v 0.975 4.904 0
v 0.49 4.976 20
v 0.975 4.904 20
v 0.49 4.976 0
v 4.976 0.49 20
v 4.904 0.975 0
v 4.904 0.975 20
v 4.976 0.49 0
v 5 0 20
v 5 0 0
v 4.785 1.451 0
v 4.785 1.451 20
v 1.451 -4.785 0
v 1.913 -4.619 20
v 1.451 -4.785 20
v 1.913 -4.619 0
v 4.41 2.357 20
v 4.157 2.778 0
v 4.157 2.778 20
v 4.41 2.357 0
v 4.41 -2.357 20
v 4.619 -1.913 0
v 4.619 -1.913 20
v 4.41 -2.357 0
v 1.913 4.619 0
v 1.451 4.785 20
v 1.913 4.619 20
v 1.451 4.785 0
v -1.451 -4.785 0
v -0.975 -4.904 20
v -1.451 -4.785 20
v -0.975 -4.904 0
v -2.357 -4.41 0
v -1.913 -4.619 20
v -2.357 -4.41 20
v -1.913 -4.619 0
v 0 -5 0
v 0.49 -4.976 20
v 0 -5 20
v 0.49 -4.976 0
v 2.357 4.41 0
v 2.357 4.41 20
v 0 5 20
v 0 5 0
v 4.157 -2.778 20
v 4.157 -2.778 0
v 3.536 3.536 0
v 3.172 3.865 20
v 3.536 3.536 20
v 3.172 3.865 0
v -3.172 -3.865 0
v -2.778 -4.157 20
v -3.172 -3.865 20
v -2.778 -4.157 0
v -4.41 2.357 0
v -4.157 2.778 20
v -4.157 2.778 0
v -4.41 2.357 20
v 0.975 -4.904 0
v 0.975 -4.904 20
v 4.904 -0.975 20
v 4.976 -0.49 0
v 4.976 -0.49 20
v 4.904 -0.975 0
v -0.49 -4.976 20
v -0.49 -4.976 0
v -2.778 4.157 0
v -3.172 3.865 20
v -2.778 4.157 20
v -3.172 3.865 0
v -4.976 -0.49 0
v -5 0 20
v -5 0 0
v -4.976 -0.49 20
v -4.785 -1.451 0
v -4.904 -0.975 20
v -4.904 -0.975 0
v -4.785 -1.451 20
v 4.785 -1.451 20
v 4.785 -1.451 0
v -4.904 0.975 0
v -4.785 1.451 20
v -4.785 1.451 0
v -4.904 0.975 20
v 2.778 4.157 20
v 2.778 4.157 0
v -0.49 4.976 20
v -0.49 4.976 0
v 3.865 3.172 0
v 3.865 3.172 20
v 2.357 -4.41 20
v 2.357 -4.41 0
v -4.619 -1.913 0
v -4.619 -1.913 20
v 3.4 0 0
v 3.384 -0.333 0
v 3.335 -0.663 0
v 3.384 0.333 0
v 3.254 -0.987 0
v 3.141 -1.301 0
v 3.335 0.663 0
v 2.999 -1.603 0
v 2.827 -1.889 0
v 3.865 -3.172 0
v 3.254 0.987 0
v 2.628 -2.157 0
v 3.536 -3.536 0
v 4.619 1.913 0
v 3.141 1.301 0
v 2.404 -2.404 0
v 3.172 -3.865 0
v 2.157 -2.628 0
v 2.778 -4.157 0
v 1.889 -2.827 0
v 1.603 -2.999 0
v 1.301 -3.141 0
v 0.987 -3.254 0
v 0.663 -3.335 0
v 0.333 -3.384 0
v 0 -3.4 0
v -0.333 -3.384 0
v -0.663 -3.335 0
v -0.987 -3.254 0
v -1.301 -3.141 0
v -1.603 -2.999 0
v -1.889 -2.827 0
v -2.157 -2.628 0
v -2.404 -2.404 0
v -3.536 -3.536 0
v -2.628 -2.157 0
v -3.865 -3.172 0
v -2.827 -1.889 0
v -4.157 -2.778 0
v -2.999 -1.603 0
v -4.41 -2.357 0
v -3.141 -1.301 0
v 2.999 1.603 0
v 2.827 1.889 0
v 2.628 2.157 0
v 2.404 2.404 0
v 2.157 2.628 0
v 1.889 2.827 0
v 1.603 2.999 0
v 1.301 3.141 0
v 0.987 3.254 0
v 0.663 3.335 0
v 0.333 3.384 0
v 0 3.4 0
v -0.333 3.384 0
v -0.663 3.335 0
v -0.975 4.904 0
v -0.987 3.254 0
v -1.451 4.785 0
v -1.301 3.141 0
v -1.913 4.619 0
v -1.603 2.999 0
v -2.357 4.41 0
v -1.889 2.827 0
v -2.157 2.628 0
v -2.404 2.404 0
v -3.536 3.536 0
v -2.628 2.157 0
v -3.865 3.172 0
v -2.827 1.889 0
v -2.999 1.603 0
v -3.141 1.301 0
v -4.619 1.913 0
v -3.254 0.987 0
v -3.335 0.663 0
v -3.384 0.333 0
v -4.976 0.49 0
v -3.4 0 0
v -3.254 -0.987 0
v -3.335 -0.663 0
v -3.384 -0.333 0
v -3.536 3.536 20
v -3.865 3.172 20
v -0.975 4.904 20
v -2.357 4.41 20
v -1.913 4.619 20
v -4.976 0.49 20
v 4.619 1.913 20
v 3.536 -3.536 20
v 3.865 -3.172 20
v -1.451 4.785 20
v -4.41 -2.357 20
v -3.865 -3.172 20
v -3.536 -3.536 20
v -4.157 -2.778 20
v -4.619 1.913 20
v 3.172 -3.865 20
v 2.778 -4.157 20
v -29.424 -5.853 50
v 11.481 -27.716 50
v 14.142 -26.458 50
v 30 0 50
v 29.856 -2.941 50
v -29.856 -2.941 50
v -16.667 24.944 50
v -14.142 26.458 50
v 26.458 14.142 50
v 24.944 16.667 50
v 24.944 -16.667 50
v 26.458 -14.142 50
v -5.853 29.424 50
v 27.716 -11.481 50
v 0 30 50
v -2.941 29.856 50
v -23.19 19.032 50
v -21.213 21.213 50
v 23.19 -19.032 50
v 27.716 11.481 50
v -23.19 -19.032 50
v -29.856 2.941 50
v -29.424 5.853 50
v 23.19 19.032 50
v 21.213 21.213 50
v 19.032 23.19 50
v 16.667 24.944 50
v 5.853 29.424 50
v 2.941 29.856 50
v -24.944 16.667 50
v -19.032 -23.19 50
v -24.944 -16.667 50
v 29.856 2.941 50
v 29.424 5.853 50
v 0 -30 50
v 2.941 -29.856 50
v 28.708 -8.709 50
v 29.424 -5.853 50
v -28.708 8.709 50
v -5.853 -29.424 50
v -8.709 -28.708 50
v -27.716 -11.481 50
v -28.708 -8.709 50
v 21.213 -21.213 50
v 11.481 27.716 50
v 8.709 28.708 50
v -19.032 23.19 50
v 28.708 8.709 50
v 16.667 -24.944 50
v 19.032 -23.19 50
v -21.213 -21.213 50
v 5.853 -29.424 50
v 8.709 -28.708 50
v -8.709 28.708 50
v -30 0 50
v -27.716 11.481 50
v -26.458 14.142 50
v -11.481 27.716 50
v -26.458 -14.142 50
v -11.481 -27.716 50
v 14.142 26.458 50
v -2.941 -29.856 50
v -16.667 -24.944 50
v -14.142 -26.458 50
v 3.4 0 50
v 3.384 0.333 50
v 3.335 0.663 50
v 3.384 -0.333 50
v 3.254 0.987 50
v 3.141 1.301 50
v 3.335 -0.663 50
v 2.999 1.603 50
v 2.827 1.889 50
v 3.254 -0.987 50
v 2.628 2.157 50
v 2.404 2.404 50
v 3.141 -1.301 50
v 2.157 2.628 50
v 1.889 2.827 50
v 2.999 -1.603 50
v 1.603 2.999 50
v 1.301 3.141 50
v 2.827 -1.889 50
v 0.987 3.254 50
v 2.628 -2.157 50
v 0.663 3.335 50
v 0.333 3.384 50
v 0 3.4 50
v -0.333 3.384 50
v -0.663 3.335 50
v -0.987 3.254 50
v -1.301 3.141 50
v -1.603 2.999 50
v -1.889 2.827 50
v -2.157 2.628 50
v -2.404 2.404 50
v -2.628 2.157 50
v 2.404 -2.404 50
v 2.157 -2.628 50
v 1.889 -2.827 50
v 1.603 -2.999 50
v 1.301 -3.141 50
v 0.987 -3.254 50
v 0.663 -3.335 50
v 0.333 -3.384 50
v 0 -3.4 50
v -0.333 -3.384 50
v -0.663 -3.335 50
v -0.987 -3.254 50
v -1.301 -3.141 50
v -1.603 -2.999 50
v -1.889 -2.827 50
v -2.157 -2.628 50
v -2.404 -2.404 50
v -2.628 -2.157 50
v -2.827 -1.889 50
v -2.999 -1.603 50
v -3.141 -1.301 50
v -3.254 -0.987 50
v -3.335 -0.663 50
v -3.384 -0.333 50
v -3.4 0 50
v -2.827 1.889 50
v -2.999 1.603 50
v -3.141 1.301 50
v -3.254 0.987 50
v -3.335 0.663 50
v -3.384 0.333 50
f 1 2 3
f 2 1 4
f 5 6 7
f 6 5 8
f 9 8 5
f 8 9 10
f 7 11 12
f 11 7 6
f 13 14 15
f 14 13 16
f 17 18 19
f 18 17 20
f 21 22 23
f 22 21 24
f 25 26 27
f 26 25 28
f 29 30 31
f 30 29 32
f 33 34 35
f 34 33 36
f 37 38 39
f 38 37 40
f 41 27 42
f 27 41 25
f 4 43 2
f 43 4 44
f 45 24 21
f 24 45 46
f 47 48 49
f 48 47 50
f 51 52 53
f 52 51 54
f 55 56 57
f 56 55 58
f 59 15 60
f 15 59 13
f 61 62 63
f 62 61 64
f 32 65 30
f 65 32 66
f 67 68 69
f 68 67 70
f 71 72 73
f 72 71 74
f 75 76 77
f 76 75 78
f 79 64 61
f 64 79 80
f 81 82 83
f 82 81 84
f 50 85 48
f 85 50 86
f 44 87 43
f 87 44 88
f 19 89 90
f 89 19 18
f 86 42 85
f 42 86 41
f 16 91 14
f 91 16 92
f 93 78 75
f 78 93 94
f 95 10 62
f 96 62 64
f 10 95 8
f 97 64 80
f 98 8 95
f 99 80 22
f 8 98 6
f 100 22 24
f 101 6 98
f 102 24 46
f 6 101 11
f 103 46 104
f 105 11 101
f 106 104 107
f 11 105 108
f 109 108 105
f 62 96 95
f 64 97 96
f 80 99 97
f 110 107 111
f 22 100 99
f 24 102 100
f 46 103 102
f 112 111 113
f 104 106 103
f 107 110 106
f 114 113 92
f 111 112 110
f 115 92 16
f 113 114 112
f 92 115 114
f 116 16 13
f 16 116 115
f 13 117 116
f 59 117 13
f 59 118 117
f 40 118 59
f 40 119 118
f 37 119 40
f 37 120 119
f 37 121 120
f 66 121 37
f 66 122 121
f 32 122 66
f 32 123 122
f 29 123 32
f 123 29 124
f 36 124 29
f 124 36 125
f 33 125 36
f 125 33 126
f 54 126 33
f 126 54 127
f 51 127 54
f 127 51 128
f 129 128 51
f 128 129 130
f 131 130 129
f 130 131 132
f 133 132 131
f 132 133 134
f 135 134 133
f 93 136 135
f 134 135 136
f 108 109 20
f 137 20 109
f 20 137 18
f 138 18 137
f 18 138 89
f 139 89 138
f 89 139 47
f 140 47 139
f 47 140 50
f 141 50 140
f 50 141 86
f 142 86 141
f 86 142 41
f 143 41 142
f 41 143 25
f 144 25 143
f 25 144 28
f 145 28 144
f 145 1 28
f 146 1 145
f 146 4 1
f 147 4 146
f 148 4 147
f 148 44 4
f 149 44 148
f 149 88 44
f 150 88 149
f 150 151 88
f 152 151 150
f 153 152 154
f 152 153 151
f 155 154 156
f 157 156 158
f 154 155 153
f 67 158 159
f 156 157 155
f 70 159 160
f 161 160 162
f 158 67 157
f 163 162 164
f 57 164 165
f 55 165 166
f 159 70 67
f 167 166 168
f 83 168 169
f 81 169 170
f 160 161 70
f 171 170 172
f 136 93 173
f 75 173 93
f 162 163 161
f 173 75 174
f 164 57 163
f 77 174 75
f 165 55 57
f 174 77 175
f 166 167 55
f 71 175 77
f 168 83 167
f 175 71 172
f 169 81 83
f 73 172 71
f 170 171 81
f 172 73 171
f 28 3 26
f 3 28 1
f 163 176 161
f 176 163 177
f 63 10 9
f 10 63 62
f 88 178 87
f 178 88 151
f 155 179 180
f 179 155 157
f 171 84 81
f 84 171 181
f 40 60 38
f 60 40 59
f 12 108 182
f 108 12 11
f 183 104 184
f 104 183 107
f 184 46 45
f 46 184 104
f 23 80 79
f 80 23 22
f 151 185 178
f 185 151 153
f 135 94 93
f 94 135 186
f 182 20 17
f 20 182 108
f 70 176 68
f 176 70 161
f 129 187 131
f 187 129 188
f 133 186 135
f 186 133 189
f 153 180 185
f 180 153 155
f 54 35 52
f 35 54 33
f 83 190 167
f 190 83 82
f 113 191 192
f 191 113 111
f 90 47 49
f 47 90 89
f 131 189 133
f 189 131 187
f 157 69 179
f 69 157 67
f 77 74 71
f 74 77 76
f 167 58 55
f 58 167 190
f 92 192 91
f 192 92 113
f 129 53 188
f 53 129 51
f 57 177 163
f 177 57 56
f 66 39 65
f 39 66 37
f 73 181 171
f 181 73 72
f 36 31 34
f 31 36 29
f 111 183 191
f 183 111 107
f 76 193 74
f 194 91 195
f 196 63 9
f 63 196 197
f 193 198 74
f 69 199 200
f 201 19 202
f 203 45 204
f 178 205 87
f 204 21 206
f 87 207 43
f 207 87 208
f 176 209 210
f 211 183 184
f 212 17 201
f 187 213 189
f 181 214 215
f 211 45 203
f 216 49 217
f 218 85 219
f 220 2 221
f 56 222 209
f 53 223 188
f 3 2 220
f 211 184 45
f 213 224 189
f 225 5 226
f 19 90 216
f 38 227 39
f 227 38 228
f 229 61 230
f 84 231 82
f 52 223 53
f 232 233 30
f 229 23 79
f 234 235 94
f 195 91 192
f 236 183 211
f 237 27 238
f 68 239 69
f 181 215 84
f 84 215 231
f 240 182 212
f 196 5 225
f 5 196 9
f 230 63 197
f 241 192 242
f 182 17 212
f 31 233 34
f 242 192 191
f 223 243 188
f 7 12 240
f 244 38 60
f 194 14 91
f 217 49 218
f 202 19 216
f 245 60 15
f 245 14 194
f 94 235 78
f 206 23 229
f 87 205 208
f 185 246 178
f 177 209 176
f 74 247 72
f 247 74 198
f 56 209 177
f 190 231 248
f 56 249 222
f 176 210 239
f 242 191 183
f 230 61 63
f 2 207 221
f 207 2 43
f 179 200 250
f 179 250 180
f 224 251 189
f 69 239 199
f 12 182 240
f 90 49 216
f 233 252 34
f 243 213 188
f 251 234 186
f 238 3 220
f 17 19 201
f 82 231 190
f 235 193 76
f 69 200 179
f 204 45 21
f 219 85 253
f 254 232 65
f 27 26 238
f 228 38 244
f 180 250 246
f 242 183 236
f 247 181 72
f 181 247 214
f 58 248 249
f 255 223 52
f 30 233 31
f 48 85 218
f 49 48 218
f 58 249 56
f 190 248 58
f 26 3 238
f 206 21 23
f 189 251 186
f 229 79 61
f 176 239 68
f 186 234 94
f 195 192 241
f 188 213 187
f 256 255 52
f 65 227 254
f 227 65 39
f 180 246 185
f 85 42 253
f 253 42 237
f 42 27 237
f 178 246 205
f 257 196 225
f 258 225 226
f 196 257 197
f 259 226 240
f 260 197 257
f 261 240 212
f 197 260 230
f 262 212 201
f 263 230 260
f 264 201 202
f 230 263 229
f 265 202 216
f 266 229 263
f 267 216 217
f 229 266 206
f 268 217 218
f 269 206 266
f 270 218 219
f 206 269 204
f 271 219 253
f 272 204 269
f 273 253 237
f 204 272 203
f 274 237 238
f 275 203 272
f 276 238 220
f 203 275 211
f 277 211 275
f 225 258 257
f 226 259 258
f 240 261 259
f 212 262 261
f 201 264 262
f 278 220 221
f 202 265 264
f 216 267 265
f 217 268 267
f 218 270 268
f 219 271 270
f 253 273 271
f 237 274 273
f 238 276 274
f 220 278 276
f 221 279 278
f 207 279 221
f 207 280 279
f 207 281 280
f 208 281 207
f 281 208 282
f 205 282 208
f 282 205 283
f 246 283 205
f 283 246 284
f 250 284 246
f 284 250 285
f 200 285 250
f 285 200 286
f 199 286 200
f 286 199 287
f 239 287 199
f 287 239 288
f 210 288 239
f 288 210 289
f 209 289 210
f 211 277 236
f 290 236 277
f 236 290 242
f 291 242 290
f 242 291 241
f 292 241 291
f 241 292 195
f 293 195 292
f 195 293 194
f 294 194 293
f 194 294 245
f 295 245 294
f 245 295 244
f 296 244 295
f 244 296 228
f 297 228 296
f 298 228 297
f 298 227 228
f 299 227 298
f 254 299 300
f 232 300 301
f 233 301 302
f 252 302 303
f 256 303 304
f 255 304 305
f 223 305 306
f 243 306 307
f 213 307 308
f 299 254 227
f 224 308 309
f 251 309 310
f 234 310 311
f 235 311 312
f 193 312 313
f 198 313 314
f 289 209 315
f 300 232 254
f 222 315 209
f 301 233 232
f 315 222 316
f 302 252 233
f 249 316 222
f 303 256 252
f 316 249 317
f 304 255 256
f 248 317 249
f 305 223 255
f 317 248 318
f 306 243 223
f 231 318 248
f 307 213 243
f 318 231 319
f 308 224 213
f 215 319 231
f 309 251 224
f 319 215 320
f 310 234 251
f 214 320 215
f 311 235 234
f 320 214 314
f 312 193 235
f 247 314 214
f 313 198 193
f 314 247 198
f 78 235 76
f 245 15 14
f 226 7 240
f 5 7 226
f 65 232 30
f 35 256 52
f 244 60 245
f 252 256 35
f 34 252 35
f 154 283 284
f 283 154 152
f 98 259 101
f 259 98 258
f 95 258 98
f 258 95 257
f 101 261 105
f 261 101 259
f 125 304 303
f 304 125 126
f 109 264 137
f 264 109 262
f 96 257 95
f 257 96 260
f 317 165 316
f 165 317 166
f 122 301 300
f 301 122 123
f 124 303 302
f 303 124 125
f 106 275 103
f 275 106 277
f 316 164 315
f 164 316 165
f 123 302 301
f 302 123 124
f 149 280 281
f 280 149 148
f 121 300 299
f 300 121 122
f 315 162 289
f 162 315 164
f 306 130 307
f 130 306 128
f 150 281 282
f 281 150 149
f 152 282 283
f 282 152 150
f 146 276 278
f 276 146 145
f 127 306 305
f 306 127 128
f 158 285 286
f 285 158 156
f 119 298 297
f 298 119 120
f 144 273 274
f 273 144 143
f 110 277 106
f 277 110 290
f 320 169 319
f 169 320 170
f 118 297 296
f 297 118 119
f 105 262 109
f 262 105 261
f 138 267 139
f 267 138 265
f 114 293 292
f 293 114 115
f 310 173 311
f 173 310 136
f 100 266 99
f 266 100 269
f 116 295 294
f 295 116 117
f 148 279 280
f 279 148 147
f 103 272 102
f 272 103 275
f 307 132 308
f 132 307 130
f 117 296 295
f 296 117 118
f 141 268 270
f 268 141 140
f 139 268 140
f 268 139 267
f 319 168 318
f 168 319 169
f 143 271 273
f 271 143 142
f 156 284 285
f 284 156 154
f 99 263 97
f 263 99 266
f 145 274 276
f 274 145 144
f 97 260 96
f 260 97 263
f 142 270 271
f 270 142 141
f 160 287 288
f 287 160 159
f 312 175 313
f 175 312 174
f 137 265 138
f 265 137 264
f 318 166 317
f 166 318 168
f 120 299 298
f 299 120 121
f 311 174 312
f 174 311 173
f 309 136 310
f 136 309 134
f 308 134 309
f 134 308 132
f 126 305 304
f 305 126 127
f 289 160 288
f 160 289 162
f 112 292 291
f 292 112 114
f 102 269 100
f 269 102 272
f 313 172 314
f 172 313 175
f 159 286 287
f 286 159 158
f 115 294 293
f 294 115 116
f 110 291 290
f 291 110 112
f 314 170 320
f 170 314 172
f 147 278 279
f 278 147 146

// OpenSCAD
// Small lab funnel – printed upright, wide opening at top, straight through bore.
// All dimensions in millimetres.

// ---- Named dimensions (measured with calipers) ----
spout_od   = 10.0;   // spout outer diameter
spout_h    = 20.0;   // spout height (z = 0 to z = 20)
cone_od    = 60.0;   // cone outer diameter at the rim (z = 50)
cone_h     = 30.0;   // cone height (z = 20 to z = 50)
wall       = 1.6;    // uniform wall thickness
bore_d     = spout_od - 2*wall;   // 6.8 mm straight bore
total_h    = spout_h + cone_h;    // 50 mm overall height

$fn = 64;            // smooth round holes / rims

// ---- Outer solid: straight spout + widening cone ----
module outer() { union() {
    // Straight spout, z = 0 to z = 20
    translate([0, 0, 0])
        cylinder(h = spout_h, d = spout_od, center = false);

    // Cone, z = 20 to z = 50 (10 mm OD -> 60 mm OD)
    translate([0, 0, spout_h])
        cylinder(h = cone_h, d1 = spout_od, d2 = cone_od, center = false);
} }

// ---- Bore: straight 6.8 mm tube running the full height, open top & bottom ----
// Extended 1 mm past each face so the cut is clean (no coplanar faces).
module bore() { translate([0, 0, -1])
    cylinder(h = total_h + 2, d = bore_d, center = false); }

// ---- Final funnel: outer solid minus the through-bore ----
difference() {
    outer();
    bore();
}
